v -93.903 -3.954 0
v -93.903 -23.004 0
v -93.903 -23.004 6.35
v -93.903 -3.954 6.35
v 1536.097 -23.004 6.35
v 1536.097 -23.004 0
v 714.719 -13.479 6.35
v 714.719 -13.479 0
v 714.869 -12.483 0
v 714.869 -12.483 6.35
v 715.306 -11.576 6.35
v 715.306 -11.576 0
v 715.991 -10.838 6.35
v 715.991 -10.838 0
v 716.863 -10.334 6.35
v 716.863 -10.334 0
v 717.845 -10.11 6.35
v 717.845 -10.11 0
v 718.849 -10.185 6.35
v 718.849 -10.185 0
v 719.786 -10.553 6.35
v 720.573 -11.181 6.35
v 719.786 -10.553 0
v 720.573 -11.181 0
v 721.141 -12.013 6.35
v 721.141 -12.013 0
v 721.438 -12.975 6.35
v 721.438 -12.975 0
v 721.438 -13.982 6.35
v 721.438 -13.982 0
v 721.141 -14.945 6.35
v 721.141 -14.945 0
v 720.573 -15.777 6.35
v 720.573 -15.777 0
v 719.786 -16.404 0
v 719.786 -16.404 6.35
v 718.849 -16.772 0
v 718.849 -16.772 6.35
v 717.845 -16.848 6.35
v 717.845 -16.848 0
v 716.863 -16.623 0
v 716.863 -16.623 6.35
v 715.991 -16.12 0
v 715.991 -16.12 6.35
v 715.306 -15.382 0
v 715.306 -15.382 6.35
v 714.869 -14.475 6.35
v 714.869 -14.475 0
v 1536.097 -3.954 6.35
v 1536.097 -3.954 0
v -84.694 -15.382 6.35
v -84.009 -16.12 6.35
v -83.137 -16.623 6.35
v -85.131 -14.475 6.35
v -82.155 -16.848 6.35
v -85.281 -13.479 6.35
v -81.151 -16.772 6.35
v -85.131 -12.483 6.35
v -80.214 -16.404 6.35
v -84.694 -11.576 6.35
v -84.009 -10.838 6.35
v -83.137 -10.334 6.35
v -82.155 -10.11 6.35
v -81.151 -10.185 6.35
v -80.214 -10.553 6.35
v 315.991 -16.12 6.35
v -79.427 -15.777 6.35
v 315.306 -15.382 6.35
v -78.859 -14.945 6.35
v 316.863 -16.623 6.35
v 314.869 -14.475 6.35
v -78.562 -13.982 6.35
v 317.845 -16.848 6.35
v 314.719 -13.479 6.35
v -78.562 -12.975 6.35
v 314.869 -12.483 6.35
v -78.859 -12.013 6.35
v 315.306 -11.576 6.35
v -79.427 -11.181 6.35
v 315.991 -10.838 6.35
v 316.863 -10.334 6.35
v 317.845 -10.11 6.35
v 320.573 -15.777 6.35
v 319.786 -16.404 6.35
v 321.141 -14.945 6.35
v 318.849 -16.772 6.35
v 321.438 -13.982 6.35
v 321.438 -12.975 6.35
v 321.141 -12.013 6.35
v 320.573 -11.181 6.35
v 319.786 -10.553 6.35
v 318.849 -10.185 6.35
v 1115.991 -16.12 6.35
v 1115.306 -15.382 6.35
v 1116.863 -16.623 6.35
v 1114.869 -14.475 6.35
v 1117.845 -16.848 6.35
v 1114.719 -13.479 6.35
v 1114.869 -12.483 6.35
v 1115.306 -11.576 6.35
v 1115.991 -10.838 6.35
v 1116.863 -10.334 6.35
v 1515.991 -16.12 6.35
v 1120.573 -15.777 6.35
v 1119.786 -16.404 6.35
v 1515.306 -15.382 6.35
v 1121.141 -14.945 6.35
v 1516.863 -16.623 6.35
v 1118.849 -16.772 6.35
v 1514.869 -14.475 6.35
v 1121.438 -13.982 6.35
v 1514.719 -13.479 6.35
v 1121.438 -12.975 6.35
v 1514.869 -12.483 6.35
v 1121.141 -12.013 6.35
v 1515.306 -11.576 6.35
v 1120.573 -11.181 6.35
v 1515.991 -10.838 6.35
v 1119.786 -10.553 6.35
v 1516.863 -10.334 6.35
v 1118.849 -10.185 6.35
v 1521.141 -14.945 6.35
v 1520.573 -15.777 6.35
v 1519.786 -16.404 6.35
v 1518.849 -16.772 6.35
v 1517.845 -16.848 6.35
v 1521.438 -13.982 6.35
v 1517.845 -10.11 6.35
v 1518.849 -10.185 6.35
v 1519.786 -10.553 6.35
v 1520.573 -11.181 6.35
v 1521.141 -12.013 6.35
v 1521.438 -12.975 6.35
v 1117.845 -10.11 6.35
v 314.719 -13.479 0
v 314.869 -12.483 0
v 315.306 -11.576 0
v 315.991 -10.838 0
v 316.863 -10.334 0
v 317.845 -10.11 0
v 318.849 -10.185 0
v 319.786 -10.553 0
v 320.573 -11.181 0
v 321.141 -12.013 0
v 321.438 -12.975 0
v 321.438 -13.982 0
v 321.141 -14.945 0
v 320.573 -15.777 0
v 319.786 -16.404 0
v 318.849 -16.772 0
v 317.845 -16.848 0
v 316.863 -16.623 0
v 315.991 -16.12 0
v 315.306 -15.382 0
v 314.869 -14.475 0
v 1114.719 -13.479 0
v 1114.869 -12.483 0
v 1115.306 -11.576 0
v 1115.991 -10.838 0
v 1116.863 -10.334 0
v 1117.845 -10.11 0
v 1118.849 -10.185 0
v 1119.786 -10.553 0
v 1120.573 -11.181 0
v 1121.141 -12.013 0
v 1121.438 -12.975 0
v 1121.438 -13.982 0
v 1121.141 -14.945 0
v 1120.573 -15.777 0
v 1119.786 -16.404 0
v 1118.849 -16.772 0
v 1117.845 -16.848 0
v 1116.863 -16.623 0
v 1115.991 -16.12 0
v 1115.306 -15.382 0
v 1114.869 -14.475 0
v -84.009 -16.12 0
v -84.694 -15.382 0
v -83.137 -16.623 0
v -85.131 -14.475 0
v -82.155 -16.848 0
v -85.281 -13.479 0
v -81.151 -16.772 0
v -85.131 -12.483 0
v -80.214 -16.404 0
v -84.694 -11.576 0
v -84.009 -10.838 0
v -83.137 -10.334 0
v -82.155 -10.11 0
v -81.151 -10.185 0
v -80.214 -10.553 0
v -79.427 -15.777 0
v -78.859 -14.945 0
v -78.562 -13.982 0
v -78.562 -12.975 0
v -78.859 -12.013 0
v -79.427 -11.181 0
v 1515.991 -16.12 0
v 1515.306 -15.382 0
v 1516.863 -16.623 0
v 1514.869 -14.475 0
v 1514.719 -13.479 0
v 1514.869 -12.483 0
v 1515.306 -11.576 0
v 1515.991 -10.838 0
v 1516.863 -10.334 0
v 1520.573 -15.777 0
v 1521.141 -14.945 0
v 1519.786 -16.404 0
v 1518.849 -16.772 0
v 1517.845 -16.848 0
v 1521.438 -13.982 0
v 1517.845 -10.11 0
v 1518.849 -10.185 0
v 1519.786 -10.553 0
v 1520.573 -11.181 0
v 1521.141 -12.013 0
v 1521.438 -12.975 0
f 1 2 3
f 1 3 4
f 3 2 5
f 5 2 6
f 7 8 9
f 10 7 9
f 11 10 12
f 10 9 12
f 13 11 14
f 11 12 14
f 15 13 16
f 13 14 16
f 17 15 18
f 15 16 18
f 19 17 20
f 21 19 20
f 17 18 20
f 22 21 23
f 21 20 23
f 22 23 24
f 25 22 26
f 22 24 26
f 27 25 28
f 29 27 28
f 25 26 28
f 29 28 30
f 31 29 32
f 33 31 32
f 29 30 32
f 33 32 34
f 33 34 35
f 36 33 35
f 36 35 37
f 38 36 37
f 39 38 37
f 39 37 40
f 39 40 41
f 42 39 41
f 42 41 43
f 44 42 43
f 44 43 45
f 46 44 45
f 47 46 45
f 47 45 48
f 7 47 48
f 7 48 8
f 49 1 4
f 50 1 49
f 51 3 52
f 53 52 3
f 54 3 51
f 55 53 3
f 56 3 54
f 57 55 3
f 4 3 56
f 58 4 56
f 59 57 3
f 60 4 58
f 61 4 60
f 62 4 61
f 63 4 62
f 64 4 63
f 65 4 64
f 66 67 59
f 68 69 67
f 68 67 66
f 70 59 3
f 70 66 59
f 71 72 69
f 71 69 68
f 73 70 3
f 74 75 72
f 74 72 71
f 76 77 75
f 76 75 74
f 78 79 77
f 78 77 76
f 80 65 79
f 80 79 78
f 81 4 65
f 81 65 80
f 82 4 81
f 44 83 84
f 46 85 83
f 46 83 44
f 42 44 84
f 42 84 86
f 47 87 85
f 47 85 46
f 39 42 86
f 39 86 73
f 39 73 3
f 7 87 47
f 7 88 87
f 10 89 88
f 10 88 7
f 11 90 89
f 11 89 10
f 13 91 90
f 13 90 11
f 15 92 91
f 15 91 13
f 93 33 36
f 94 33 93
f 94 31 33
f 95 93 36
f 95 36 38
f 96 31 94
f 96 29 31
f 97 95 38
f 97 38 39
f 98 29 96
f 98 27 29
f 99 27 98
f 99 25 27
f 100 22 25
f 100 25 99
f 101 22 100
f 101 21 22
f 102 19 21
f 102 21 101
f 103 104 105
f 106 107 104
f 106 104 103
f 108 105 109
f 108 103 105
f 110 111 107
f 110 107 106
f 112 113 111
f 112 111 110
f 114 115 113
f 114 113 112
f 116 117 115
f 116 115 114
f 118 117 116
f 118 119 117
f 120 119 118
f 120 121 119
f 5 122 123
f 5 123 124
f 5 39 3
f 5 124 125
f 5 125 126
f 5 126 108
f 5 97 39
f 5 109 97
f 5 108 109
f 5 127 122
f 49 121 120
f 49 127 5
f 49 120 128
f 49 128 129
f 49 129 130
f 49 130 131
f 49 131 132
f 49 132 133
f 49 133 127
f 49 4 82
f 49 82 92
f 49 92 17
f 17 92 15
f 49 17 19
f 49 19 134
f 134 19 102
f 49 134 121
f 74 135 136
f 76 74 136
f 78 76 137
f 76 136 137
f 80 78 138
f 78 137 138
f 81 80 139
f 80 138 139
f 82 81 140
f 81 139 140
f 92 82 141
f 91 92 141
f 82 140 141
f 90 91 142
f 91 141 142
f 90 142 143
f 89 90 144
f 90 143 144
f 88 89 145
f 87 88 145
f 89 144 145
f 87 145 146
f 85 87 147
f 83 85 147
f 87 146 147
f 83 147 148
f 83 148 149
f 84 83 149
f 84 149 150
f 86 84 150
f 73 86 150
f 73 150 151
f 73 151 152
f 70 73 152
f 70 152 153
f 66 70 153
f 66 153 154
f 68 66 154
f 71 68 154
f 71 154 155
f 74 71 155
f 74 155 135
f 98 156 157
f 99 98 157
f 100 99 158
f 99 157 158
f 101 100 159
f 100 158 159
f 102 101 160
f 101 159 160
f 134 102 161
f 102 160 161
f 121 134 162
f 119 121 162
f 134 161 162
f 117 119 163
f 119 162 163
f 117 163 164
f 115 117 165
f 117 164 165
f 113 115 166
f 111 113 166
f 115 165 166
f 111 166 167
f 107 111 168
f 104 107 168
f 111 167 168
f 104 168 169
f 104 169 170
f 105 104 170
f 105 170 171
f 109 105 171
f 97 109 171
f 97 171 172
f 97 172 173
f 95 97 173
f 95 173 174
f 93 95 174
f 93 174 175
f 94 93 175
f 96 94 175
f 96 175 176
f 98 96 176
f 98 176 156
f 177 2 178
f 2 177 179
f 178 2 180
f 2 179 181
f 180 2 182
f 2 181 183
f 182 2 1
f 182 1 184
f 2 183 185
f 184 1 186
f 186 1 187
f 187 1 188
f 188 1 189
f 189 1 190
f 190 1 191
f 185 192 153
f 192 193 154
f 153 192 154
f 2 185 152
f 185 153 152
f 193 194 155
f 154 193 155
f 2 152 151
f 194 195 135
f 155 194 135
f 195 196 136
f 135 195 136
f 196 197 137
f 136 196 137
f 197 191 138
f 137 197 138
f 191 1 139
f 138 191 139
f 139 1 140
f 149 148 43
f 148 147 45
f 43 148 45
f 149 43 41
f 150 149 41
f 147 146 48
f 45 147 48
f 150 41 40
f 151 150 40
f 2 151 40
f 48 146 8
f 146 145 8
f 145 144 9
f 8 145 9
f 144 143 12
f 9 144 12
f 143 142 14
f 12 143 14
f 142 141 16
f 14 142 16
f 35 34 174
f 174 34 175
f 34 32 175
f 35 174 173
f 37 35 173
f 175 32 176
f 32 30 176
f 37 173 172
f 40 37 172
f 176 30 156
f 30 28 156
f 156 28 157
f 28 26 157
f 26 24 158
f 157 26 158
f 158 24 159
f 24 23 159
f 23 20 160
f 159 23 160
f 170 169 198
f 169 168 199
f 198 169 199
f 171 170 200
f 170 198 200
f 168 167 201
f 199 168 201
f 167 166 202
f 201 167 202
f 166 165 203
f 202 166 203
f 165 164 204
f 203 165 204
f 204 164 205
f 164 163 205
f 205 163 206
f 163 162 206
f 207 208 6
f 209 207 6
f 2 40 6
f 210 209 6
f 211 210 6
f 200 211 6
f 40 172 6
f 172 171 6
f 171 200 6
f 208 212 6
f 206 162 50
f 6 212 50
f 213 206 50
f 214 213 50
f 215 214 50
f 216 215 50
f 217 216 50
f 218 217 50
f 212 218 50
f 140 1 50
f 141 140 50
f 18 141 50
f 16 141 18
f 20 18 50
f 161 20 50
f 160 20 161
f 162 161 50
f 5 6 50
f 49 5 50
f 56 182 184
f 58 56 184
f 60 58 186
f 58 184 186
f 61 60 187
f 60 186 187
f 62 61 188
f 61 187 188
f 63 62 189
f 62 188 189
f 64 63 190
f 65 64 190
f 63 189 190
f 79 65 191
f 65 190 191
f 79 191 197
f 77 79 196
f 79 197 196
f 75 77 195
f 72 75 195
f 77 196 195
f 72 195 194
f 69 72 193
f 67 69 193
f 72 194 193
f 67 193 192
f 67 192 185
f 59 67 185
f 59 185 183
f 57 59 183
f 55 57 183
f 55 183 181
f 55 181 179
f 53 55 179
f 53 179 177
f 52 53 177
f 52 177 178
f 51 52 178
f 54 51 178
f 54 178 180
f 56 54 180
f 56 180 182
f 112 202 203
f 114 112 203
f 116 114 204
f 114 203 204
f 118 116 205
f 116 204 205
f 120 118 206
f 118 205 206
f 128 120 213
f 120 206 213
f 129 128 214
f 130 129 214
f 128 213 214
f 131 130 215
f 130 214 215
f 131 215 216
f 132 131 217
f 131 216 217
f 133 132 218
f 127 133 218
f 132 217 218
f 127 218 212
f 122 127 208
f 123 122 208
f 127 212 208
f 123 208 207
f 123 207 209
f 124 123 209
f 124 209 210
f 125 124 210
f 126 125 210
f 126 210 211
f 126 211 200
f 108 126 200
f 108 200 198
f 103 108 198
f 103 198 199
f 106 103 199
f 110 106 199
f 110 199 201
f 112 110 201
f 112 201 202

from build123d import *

# Parameters (mm, degrees)
CROQUIS1_W                    = 1630
CROQUIS1_H                    = 19.05
BRIDA_BASE1_DEPTH             = 6.35
TALADRO_DE_MARGEN_PARA_1_41_D = 6.7564


# Sheet-metal steps are written as plain solids
with BuildPart() as part:
    # Croquis1 → Brida base1 (new body)
    with BuildSketch(Plane.XY):
        with Locations((721.097089126, -13.478773585)):
            Rectangle(CROQUIS1_W, CROQUIS1_H)
    extrude(amount=BRIDA_BASE1_DEPTH)

    # Taladro de margen para 1/41 (through all)
    with Locations(Plane.XY.offset(6.35)):
        with Locations((-81.902910874, -13.478773585), (318.097089126, -13.478773585), (718.097089126, -13.478773585), (1118.097089126, -13.478773585), (1518.097089126, -13.478773585)):
            Hole(TALADRO_DE_MARGEN_PARA_1_41_D / 2)


solid = part.part
